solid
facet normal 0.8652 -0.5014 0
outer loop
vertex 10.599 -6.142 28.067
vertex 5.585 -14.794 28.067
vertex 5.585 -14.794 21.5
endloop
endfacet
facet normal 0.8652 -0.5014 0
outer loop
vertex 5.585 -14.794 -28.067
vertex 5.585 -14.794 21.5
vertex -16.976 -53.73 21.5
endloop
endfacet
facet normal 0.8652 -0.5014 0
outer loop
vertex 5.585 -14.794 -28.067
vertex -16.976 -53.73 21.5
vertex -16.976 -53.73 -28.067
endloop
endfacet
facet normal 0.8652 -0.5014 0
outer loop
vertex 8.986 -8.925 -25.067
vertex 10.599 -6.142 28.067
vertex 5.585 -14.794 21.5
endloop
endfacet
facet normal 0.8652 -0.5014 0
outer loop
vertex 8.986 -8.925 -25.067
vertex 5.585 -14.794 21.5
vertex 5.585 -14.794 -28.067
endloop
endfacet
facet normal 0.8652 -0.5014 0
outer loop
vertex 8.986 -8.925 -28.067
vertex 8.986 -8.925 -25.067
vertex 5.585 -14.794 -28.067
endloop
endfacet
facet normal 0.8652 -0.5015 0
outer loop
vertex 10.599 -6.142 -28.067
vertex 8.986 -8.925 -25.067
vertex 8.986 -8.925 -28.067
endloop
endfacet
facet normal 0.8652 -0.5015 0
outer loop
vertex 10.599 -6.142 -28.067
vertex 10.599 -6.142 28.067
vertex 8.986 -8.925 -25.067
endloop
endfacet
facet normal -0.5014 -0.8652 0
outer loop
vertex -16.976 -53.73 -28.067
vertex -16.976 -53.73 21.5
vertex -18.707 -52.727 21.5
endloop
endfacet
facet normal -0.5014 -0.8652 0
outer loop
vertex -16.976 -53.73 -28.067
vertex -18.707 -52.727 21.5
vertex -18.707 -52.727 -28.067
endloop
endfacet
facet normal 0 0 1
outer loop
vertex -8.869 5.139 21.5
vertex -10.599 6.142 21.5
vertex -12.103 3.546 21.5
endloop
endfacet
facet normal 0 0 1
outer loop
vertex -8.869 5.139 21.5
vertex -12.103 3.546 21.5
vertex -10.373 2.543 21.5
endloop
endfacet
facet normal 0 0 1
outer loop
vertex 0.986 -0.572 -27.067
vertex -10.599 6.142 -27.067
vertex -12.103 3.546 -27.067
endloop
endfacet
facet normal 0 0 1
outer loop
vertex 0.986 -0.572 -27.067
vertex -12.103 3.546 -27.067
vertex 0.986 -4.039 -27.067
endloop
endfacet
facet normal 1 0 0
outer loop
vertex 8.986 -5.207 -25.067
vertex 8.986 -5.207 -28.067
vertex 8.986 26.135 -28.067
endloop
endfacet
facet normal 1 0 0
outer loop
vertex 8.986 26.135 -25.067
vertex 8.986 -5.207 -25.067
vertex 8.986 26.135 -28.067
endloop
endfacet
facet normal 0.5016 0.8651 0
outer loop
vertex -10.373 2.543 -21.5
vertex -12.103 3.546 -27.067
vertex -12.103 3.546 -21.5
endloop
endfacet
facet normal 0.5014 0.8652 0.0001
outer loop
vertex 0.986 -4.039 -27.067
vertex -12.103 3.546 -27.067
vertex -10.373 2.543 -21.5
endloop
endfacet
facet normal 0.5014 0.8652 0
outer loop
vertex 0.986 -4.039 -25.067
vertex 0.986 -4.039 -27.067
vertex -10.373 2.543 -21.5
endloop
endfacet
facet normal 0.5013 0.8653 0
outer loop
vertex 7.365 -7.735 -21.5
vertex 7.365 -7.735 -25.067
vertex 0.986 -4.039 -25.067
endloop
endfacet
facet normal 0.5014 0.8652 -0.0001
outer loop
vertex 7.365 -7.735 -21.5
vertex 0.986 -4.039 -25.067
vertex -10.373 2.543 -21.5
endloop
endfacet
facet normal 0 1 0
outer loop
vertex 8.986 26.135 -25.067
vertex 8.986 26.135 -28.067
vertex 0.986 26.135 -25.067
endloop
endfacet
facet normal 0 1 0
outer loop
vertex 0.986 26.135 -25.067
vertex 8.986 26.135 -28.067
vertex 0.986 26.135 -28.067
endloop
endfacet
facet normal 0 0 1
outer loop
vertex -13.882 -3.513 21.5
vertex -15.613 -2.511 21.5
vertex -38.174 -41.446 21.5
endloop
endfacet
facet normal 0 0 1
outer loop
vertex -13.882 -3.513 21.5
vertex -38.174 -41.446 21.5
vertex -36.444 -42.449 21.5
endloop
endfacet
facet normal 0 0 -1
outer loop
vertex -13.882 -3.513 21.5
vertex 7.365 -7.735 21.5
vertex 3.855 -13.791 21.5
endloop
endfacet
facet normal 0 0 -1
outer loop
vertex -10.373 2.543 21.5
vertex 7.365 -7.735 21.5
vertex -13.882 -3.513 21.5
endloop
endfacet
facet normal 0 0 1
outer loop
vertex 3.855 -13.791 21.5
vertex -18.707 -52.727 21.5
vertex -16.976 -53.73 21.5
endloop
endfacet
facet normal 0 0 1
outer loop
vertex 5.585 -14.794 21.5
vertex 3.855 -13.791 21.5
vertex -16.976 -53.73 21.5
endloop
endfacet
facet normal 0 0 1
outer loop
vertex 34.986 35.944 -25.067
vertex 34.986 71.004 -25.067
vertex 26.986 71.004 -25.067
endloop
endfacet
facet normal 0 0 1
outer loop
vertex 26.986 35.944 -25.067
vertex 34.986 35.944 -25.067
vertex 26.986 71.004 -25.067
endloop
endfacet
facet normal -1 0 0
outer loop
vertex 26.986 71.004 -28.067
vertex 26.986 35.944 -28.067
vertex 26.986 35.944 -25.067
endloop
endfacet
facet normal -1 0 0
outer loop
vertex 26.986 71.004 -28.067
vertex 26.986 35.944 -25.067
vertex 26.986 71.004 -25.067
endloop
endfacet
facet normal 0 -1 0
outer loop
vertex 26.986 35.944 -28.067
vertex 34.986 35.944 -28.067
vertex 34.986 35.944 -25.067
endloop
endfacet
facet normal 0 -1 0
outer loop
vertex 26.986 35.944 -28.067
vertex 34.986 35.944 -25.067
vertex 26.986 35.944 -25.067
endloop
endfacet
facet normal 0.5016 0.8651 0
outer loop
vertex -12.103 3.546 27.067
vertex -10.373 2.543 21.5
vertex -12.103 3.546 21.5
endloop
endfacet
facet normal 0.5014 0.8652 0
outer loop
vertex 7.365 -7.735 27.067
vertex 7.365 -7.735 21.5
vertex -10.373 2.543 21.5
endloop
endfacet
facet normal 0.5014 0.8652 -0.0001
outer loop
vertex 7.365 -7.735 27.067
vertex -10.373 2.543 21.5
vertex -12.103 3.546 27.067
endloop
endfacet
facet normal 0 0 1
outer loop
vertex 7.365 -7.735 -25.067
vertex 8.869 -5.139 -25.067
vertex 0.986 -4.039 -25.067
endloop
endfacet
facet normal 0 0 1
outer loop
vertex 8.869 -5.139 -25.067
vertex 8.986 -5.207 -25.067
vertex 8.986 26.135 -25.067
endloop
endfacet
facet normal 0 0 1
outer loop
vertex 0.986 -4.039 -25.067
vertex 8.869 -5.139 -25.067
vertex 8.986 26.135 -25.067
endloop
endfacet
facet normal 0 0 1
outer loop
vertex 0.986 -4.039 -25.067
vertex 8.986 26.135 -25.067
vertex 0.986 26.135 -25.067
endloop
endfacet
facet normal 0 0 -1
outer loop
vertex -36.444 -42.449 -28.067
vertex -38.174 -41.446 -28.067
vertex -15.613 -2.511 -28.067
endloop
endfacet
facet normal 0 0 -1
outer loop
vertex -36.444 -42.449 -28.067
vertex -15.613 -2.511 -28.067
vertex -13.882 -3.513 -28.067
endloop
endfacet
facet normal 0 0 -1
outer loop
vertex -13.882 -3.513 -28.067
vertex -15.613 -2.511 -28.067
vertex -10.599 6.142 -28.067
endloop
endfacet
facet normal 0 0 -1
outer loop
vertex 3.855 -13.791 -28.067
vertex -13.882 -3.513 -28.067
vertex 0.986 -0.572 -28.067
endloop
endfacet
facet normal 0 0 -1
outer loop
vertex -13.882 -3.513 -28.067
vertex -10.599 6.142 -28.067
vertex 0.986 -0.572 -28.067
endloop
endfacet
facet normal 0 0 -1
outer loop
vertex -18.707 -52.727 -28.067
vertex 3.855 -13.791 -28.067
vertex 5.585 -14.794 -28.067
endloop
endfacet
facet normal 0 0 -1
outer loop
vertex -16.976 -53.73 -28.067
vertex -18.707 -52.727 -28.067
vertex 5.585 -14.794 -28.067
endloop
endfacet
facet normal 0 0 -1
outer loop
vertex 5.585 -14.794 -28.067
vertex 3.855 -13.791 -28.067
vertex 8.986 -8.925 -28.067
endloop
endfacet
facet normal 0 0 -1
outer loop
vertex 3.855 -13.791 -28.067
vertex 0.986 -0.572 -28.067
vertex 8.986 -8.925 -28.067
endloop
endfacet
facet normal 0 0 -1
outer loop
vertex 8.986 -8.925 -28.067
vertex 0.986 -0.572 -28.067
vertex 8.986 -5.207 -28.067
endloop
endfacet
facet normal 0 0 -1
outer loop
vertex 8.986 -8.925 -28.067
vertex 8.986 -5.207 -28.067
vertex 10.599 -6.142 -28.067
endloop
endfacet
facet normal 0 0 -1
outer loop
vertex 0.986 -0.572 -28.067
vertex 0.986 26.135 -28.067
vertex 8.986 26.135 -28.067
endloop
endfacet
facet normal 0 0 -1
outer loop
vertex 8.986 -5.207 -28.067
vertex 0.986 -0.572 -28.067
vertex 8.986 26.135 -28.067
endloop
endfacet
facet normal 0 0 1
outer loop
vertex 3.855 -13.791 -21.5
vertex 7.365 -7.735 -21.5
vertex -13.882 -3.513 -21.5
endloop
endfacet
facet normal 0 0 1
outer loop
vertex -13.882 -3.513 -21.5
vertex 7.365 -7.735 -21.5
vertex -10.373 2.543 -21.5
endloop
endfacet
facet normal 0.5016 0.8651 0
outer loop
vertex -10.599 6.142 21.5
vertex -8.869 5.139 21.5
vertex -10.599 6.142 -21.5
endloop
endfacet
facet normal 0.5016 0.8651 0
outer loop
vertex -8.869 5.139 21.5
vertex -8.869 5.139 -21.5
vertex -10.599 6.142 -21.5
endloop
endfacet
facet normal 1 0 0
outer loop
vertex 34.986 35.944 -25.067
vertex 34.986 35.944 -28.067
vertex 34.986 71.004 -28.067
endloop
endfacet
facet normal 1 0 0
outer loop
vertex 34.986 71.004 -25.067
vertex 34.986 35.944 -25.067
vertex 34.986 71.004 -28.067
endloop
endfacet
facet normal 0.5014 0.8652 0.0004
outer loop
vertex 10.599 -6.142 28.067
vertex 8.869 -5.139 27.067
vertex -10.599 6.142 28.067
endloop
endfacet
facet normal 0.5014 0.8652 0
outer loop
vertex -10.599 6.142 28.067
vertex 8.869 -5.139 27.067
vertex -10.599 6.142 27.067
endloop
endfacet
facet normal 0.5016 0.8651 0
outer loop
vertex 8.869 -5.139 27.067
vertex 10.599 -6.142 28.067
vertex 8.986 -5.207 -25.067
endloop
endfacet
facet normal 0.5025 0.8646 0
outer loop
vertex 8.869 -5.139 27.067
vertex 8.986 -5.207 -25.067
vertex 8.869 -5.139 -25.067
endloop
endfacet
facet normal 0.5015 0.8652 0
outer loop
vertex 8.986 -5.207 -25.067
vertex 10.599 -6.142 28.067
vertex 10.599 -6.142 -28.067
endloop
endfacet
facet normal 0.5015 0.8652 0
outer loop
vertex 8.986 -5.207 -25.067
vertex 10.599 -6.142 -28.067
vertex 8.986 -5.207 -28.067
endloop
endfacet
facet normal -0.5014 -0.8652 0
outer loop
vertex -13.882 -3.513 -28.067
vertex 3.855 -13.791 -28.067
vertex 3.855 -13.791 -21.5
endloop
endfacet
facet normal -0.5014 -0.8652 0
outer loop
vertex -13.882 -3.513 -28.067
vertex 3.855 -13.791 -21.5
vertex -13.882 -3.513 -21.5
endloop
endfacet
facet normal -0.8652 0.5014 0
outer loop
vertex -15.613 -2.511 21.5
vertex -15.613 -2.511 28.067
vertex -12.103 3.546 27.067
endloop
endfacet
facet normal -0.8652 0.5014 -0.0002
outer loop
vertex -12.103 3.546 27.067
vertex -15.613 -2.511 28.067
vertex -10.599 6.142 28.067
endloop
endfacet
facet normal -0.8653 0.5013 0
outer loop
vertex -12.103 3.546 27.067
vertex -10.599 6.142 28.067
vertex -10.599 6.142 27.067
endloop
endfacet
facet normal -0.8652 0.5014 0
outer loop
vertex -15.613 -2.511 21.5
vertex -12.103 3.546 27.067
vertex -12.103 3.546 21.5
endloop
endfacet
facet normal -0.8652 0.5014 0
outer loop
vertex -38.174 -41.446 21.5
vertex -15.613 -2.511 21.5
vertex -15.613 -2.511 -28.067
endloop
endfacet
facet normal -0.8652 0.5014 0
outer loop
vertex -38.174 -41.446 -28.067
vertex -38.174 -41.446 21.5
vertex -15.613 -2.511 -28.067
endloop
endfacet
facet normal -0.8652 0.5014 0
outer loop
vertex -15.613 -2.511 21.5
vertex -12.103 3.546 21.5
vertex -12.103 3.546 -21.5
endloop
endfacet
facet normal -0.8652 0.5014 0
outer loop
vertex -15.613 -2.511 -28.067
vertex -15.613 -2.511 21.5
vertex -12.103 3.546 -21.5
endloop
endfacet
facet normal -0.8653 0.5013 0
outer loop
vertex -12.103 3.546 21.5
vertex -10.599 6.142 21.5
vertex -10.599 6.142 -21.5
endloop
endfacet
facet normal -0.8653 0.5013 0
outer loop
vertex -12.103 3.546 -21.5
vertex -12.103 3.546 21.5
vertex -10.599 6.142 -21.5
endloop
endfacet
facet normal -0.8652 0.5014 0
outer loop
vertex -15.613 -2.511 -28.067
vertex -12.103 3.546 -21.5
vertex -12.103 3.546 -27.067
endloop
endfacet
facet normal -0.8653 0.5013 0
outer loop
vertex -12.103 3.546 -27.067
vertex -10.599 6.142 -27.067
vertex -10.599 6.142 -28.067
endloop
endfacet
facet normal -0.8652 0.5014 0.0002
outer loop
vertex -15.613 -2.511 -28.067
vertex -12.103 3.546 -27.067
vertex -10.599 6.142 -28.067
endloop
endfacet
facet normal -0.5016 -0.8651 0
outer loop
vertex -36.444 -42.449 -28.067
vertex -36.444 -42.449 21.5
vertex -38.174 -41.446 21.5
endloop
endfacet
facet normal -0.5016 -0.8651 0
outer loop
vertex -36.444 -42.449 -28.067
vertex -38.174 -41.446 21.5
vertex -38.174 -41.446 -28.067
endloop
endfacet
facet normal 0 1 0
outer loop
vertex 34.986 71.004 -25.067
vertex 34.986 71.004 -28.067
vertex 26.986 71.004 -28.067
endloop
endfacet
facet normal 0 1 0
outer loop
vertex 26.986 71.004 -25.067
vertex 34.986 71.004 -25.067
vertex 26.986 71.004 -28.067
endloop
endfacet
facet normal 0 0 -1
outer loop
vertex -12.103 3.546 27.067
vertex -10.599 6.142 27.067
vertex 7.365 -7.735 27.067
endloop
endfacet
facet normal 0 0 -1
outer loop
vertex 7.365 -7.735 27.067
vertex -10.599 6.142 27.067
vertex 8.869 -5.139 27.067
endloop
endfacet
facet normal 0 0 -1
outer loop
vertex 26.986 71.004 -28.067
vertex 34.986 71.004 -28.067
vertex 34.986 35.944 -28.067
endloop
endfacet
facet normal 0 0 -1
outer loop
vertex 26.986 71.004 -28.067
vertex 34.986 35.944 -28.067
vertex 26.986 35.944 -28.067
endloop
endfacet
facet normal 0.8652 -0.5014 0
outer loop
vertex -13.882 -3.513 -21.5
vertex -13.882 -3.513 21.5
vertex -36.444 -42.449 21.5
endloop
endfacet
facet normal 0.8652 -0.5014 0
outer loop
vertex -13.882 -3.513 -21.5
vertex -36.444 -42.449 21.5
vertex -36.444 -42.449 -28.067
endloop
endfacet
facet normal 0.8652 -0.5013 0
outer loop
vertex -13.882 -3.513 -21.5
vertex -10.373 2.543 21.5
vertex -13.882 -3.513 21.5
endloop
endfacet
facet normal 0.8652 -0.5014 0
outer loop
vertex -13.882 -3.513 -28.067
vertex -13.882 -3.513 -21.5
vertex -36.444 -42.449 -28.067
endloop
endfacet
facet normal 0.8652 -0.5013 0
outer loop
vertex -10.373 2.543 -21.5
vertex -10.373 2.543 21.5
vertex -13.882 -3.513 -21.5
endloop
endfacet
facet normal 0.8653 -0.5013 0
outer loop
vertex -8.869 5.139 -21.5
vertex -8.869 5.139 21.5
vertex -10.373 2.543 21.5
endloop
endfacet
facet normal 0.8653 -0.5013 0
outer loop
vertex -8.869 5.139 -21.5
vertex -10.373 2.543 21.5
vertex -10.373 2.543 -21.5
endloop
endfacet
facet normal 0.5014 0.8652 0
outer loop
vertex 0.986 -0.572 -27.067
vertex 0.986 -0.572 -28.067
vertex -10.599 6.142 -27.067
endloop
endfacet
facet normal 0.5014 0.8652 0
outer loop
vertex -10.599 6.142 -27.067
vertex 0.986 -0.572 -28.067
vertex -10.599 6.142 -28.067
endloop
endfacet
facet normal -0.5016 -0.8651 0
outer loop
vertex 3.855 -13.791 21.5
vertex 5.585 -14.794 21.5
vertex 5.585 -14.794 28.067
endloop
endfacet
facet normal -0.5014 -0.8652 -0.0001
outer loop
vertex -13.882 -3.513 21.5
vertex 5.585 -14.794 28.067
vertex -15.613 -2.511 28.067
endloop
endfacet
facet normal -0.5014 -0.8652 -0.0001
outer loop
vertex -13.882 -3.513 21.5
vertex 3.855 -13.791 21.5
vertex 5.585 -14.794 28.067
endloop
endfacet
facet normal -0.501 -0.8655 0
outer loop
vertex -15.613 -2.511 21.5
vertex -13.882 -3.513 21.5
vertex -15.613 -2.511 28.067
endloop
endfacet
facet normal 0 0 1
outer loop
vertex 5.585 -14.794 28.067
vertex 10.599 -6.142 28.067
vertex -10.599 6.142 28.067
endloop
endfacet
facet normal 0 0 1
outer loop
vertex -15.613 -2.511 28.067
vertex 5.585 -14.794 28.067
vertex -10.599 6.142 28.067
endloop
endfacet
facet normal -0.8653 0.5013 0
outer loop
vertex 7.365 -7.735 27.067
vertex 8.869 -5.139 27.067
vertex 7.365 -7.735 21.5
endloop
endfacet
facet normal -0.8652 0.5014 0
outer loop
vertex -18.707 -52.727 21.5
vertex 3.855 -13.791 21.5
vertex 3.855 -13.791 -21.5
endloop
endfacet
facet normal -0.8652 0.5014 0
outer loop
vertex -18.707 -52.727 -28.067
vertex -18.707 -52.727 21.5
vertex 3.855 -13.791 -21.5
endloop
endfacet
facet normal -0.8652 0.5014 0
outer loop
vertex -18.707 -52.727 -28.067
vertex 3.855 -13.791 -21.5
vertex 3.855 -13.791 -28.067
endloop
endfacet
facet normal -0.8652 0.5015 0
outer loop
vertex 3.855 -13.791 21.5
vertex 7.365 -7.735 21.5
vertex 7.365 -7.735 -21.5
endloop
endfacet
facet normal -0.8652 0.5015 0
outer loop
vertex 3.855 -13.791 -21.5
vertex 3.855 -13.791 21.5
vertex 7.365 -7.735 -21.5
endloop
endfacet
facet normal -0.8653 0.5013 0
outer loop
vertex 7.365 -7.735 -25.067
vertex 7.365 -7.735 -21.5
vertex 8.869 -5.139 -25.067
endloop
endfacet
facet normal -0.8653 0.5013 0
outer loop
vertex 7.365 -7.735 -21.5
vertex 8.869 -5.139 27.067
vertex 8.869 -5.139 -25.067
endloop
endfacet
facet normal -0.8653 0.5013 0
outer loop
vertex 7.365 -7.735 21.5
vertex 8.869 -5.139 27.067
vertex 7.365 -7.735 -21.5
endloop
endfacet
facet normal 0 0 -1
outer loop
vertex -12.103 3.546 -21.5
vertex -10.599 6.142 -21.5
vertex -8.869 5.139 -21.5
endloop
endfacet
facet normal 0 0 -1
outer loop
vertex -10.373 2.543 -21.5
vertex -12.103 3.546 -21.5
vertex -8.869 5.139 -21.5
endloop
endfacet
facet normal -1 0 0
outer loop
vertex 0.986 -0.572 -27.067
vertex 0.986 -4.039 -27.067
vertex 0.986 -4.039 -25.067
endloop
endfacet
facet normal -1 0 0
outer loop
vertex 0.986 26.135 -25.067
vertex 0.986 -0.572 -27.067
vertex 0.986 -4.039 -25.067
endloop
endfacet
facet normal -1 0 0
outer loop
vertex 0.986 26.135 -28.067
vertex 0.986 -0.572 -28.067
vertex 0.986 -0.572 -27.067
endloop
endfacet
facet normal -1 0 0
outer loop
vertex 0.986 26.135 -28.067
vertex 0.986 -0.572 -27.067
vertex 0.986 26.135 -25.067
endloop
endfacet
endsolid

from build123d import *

# Parameters (mm, degrees)
SKETCH1_W           = 24.5
SKETCH1_H           = 56.133598892
SKETCH1_W_2         = 20.5
SKETCH1_H_2         = 43
BOSS_EXTRUDE1_DEPTH = 10
SKETCH16_W          = 49.566799446
SKETCH16_H          = 2
BOSS_EXTRUDE4_DEPTH = 45
SKETCH17_W          = 5.566799446
SKETCH17_H          = 991.145807274
CUT_EXTRUDE1_DEPTH  = 3
SKETCH18_W          = 8
SKETCH18_H          = 35.060194027
BOSS_EXTRUDE5_DEPTH = 3


with BuildPart() as part:
    # Sketch1 → Boss-Extrude1 (new body)
    with BuildSketch(Plane(origin=(0, 0, 0), x_dir=(-0.8652328616944664, 0.5013702175478758, -1.6721667044488096e-15), z_dir=(-0.5013702175478757, -0.8652328616944664, 2.9404411120007117e-15))):
        Rectangle(SKETCH1_W, SKETCH1_H)
        Rectangle(SKETCH1_W_2, SKETCH1_H_2, mode=Mode.SUBTRACT)
    extrude(amount=BOSS_EXTRUDE1_DEPTH)

    # Sketch16 → Boss-Extrude4 (add)
    with BuildSketch(Plane(origin=(-5.013702175, -8.652328617, 0), x_dir=(0, 0, -1), z_dir=(-0.5013702175478768, -0.8652328616944658, -1.9530974013437786e-15))):
        with Locations((3.283399723, 11.25)):
            Rectangle(SKETCH16_W, SKETCH16_H)
        with Locations((3.283399723, -11.25)):
            Rectangle(SKETCH16_W, SKETCH16_H)
    extrude(amount=BOSS_EXTRUDE4_DEPTH)

    # Sketch17 → Cut-Extrude1 (cut)
    with BuildSketch(Plane(origin=(0, 0, 0), x_dir=(0, 0, 1), z_dir=(0.5013702175478768, 0.8652328616944658, 1.9530974013437786e-15))):
        with Locations((-24.283399723, -485.322903637)):
            Rectangle(SKETCH17_W, SKETCH17_H)
        with Locations((24.283399723, -485.322903637)):
            Rectangle(SKETCH17_W, SKETCH17_H)
    extrude(amount=-CUT_EXTRUDE1_DEPTH, mode=Mode.SUBTRACT)

    # Sketch18 → Boss-Extrude5 (add)
    with BuildSketch(Plane(origin=(0, 0, -28.066799446), x_dir=(-1, 0, 0), z_dir=(0, 0, -1))):
        with Locations((-30.986297825, 53.474183751)):
            Rectangle(SKETCH18_W, SKETCH18_H)
        with Locations((-4.986297825, 8.60503593)):
            Rectangle(SKETCH18_W, SKETCH18_H)
    extrude(amount=-BOSS_EXTRUDE5_DEPTH)


with BuildPart() as boss_extrude5_piece_1:
    # of the separate pieces the step leaves, piece 1, a body of its own (boss_extrude5_pieces)
    add(part.part.solids().sort_by_distance((10.599102556, -6.141785165, -28.066799446))[0])


with BuildPart() as boss_extrude5_piece_2:
    # of the separate pieces the step leaves, piece 2, a body of its own (boss_extrude5_pieces)
    add(part.part.solids().sort_by_distance((34.986297825, 35.944086737, -28.066799446))[0])


solid = Compound([boss_extrude5_piece_1.part, boss_extrude5_piece_2.part])
